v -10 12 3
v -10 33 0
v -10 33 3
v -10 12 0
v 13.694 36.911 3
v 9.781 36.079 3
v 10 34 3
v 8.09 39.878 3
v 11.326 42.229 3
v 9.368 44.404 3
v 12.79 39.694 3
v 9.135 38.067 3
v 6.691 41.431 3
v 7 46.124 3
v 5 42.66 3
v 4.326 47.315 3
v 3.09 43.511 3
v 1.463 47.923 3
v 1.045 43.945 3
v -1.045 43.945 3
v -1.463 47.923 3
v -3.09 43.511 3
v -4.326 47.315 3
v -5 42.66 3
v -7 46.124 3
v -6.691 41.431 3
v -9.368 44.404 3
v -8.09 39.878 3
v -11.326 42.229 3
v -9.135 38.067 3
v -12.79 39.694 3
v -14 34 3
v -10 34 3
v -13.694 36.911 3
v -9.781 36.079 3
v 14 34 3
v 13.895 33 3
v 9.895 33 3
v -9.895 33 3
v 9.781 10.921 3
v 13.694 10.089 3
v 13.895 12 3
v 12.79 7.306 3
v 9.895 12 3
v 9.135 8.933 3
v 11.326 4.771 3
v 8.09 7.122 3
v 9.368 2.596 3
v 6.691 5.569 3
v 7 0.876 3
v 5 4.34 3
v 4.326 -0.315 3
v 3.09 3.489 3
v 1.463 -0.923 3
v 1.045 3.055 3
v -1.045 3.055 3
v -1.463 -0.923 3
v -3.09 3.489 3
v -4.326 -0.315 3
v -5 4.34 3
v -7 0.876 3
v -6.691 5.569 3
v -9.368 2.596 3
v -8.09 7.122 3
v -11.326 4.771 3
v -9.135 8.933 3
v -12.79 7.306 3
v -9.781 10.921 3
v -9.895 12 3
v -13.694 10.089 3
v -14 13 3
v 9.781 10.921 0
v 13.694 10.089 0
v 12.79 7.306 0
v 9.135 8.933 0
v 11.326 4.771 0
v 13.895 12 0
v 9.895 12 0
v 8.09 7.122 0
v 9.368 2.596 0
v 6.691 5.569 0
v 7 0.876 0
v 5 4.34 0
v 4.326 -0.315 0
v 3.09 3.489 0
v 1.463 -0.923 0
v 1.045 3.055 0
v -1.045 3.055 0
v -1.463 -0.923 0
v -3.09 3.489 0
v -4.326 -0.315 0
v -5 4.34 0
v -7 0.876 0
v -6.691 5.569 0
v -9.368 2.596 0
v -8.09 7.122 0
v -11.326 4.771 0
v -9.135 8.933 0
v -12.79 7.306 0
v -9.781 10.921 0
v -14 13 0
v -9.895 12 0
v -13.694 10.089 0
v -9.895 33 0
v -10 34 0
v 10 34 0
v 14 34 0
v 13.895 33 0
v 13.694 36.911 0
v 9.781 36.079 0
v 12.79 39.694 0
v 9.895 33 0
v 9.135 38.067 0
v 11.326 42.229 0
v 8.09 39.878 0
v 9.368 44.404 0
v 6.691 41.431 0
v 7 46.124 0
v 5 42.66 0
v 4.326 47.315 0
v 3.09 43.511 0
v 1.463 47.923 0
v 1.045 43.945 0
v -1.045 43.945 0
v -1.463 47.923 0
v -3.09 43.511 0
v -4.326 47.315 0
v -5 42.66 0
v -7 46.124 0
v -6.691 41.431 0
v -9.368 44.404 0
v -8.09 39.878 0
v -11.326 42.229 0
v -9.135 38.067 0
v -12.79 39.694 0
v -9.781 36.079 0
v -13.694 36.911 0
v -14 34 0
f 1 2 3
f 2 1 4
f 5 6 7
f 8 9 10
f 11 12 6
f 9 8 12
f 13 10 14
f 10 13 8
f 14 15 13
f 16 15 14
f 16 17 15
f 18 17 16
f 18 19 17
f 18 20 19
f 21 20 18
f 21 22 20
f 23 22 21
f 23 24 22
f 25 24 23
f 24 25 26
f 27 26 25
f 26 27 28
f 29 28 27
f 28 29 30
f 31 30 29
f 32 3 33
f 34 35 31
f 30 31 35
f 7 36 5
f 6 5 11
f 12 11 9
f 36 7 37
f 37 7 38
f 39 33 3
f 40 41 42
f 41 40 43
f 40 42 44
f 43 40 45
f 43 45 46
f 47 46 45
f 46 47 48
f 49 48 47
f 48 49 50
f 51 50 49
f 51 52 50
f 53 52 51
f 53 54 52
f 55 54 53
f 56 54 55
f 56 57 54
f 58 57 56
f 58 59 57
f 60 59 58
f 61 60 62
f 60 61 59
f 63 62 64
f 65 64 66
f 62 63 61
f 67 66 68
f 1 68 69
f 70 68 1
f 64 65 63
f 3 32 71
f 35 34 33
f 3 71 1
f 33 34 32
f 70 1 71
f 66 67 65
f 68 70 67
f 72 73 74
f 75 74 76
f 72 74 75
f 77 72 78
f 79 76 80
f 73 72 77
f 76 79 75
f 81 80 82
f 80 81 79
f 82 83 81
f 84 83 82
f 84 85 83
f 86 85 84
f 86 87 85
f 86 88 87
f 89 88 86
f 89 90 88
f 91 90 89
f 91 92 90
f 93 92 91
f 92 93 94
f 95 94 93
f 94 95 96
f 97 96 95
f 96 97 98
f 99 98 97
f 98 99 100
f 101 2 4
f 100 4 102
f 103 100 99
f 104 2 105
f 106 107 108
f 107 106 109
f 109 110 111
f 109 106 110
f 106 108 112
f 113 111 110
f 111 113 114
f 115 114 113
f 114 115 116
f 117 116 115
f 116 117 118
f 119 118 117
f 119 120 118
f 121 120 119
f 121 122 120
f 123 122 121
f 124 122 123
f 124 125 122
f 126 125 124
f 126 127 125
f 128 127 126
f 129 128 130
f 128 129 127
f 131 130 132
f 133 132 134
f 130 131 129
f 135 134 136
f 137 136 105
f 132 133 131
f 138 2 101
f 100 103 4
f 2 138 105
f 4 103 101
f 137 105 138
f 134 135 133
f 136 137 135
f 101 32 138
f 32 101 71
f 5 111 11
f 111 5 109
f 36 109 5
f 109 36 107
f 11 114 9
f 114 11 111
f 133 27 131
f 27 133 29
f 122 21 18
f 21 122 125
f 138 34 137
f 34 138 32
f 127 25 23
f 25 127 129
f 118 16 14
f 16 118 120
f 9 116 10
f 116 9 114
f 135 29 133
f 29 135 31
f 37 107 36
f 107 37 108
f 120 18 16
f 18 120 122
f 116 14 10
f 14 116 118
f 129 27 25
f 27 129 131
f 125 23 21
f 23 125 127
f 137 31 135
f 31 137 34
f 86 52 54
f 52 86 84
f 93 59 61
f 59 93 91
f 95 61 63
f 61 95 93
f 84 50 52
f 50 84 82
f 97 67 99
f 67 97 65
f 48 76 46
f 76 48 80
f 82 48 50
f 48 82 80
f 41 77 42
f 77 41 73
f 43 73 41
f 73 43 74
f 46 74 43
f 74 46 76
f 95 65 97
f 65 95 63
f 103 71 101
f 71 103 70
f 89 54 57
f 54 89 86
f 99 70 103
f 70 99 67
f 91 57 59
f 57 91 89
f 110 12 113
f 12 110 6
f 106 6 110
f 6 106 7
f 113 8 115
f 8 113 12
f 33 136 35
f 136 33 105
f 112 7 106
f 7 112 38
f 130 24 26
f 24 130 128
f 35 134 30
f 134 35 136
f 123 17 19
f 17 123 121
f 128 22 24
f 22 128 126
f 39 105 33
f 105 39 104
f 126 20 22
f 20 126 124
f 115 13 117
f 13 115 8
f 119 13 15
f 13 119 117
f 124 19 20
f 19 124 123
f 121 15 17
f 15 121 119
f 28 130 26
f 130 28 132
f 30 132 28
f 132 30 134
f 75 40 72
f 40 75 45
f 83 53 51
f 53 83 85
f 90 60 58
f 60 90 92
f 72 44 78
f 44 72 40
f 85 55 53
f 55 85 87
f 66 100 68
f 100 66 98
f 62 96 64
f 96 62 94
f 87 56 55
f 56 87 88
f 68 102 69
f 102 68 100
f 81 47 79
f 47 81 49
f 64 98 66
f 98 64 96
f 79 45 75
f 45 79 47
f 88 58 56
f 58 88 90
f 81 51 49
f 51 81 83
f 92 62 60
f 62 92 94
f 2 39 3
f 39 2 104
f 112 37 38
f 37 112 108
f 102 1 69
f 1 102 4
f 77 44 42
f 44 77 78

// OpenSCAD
// буква с

module c(){
difference(){
union(){
  translate([-14,13,0]) cube([4,y,z]);
  translate([0,2y,0]) cylinder(z,x,x);
  translate([0,13,0]) cylinder(z,x,x);  
}
  translate([0,2y,-1]) cylinder(z2,x2,x2);
  translate([0,13,-1]) cylinder(z2,x2,x2);
  translate([-10,12,-1]) cube([30,y,z2]);


}
}
 c(x=14, 2y=34, y=21, z=3, x2=10, z2=5);
